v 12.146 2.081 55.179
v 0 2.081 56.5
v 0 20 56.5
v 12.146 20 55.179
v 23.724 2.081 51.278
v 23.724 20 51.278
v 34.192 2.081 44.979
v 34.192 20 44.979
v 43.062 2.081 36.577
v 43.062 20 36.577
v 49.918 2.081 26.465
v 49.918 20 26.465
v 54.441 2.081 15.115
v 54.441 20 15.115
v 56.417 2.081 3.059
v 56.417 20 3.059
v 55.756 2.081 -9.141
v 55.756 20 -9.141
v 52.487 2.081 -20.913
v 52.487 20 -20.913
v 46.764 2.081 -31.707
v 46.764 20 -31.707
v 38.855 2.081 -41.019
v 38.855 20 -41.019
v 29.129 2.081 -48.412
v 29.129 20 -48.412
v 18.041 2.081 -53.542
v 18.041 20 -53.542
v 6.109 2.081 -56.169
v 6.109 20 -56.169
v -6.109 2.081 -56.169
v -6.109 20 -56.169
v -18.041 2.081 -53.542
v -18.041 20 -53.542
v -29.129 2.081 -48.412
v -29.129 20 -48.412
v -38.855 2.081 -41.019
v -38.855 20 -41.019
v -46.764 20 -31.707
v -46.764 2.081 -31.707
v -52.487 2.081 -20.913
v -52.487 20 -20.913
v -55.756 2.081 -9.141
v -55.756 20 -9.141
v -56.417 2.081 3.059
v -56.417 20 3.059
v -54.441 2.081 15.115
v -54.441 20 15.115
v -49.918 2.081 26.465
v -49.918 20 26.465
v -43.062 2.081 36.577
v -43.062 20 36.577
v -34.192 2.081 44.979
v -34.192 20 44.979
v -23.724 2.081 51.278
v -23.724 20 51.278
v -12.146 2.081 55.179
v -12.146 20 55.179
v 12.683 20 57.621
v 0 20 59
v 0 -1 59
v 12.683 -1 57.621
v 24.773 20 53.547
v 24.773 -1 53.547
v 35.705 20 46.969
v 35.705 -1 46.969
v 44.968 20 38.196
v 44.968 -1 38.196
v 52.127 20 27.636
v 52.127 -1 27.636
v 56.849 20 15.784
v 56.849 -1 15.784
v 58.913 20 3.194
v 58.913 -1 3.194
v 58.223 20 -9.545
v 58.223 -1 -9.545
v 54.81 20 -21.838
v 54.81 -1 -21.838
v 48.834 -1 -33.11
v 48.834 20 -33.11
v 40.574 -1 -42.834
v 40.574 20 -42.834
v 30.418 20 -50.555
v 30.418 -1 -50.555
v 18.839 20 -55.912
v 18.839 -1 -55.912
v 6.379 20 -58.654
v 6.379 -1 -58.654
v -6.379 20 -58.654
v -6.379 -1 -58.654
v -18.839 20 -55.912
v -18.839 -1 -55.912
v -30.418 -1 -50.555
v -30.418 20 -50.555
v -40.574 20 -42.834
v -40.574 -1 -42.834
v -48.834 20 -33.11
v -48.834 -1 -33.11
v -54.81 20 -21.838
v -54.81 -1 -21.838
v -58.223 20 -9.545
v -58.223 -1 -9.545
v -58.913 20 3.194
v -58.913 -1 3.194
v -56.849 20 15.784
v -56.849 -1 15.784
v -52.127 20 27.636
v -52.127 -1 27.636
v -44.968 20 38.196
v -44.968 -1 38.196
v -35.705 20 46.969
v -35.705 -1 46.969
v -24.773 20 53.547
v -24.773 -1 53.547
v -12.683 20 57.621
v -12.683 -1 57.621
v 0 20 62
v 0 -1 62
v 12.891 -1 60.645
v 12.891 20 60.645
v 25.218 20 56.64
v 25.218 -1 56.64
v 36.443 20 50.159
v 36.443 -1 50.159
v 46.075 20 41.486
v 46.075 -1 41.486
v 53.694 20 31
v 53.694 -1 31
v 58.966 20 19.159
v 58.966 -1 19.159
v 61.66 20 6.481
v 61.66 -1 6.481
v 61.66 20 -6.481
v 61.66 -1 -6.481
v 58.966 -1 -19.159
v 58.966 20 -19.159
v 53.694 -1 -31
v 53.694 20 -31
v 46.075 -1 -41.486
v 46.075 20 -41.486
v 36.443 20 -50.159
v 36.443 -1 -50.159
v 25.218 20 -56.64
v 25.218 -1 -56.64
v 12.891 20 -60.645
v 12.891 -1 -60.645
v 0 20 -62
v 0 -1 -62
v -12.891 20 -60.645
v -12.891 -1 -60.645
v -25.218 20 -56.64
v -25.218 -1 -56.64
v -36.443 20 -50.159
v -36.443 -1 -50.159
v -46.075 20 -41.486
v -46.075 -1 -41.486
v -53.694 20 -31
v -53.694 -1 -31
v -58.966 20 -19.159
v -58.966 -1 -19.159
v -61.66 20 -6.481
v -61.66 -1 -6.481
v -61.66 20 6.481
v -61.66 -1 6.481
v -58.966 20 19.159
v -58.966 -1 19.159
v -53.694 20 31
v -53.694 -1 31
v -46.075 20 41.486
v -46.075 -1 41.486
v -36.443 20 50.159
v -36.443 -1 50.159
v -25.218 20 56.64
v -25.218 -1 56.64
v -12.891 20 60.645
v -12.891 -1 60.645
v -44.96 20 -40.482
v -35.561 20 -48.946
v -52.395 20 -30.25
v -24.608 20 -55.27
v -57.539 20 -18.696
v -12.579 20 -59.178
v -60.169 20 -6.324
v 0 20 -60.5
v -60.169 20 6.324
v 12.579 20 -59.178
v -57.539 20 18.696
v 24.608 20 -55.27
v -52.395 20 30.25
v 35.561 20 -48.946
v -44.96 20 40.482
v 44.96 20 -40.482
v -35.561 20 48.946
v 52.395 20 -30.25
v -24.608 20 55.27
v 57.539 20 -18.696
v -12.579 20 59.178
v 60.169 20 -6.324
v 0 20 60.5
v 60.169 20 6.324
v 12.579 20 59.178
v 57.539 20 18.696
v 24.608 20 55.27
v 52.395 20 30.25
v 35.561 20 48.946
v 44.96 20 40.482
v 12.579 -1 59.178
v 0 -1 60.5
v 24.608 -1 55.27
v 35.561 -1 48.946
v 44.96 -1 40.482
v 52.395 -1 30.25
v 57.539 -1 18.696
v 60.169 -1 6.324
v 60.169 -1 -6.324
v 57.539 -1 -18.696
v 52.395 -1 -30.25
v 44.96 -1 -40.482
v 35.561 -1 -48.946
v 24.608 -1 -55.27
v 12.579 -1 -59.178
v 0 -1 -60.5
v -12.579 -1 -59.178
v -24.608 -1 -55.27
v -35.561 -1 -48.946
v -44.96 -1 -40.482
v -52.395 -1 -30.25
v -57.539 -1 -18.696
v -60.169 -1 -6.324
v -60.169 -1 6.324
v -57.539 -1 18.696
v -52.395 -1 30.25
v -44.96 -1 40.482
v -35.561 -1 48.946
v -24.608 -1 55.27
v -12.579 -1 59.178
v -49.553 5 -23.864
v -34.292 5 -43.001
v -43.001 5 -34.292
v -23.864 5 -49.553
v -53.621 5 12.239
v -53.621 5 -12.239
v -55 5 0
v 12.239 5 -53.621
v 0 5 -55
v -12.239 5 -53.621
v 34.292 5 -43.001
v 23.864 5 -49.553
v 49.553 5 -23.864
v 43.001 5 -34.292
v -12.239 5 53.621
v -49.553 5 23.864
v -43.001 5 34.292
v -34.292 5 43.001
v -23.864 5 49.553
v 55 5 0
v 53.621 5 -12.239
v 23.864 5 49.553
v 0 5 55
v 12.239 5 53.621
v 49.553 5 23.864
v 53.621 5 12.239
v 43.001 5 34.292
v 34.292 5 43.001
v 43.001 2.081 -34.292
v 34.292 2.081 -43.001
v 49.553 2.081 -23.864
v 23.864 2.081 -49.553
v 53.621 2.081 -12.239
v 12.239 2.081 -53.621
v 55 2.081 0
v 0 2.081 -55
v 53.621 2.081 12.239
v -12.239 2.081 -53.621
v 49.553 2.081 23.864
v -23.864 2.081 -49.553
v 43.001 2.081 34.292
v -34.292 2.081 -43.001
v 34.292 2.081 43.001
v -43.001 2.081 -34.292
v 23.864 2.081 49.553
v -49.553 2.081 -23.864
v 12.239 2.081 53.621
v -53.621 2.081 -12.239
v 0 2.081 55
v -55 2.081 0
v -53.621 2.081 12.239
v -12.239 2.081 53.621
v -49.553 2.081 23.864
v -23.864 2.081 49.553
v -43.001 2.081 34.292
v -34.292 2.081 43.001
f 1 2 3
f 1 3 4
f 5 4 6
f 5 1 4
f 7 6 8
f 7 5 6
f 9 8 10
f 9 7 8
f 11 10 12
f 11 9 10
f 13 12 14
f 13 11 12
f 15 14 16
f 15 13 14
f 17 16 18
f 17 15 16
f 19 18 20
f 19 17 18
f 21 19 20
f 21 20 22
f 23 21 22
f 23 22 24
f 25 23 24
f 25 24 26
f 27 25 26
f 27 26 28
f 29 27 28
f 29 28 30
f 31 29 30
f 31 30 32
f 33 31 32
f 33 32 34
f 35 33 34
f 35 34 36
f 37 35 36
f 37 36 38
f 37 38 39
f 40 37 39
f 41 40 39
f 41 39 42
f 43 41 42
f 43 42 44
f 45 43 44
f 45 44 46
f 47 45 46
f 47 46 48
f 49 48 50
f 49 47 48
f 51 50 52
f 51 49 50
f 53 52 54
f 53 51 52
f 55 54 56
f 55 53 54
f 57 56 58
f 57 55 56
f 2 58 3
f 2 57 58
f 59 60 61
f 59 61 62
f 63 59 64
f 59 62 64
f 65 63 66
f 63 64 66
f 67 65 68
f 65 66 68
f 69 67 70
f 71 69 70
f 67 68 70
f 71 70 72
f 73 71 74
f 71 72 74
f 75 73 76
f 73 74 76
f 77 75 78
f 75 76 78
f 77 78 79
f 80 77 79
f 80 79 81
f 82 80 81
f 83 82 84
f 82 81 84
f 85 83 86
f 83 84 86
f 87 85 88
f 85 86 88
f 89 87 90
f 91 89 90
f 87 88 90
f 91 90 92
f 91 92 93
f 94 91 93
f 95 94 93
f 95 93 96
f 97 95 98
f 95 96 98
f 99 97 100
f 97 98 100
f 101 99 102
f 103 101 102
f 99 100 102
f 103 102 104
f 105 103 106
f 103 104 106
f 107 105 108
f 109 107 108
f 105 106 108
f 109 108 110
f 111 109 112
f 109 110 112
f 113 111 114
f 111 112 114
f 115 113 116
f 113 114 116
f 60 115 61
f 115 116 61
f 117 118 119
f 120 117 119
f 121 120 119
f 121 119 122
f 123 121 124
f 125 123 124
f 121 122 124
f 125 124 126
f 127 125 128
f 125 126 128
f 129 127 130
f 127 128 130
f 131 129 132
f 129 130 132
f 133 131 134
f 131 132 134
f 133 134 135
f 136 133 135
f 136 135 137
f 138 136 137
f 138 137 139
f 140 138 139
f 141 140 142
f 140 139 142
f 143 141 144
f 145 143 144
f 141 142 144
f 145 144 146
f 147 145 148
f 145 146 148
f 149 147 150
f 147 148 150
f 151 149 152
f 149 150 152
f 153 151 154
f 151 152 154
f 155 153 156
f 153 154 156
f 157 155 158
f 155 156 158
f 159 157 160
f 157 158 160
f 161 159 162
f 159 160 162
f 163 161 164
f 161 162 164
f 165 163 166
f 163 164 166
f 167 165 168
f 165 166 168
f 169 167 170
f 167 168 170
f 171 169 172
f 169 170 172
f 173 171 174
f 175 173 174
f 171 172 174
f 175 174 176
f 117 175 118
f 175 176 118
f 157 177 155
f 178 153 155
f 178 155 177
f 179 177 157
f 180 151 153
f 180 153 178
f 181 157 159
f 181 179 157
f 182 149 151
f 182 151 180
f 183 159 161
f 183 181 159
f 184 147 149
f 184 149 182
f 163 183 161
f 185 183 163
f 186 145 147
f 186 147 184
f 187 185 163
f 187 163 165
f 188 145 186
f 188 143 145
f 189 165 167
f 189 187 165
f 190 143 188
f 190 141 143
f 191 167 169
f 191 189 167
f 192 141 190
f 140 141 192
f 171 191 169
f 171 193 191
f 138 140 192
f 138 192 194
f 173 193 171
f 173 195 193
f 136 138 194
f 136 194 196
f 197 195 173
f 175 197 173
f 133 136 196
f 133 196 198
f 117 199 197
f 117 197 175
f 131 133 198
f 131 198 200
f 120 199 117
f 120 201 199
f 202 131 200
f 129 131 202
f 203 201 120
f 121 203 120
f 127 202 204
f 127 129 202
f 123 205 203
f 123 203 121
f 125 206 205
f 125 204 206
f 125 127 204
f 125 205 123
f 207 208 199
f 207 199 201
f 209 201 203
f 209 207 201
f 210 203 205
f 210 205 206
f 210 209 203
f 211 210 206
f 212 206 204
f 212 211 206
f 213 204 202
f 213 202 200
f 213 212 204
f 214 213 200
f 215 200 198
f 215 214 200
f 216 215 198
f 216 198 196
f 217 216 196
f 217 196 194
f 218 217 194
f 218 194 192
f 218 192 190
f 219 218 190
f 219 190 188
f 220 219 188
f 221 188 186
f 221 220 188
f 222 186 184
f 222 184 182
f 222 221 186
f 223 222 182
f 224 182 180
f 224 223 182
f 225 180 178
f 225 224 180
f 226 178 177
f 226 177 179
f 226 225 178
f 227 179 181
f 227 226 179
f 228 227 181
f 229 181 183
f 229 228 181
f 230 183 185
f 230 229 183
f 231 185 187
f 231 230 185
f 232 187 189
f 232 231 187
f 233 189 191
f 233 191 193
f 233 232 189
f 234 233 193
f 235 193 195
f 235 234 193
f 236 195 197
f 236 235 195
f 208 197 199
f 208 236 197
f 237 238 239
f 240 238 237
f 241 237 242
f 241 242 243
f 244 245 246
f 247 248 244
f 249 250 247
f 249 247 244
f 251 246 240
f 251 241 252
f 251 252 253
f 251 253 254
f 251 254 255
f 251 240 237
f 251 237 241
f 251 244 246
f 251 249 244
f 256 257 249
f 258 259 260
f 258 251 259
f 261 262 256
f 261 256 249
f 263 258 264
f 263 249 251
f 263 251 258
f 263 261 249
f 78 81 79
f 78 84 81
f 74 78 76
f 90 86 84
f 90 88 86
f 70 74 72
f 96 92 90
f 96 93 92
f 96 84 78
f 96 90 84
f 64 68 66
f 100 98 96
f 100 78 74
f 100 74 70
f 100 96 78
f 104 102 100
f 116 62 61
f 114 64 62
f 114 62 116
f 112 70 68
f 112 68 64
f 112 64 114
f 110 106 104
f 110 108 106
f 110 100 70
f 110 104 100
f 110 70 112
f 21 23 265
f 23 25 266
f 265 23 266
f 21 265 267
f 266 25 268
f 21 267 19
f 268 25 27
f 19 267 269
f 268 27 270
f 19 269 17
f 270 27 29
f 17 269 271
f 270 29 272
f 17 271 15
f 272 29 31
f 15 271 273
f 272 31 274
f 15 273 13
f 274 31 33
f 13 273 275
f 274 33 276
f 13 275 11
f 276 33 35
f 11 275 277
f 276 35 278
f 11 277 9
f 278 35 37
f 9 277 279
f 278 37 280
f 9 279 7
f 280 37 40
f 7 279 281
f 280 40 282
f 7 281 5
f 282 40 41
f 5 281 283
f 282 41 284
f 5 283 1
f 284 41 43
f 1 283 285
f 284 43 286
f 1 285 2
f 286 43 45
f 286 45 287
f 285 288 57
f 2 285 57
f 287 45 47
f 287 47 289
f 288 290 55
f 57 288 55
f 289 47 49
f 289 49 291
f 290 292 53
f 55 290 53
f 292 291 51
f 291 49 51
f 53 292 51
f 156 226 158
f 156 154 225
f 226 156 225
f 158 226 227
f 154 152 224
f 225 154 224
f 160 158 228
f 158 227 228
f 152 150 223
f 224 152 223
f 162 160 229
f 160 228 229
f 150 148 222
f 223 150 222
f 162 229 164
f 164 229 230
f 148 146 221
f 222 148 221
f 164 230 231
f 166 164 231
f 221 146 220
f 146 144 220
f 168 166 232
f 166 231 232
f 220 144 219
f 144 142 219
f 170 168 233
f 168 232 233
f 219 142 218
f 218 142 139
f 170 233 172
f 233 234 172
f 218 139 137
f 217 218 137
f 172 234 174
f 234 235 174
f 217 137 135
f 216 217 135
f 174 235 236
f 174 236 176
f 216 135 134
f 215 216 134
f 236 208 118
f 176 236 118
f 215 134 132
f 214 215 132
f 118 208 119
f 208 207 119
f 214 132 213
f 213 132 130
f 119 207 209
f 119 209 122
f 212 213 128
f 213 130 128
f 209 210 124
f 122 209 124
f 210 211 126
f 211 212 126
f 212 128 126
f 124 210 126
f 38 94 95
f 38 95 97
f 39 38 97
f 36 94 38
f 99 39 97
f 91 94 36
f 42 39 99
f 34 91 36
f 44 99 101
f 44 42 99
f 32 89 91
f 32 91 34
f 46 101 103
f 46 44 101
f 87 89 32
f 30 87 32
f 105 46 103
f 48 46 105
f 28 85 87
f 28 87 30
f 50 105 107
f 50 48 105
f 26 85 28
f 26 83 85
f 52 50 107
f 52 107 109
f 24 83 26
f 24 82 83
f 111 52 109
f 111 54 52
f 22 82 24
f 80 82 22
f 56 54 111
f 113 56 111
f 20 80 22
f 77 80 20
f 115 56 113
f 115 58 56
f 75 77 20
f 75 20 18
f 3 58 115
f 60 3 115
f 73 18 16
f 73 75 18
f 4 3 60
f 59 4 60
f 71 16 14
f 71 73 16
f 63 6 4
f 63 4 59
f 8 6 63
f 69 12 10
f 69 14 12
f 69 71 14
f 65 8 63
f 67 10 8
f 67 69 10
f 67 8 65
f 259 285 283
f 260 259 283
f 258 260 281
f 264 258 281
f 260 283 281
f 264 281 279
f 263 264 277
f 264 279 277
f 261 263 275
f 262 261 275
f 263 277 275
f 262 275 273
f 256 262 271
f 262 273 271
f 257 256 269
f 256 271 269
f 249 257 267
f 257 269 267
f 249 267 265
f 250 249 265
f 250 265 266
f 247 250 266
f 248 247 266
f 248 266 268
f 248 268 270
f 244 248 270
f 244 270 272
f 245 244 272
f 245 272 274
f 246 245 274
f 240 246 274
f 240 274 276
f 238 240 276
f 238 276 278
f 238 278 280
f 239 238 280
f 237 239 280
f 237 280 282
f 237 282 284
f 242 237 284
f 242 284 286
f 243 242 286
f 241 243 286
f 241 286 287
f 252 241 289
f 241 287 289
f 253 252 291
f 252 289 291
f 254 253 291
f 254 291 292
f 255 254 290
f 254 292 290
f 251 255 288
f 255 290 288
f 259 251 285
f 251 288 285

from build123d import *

# Parameters (mm, degrees)
BOSS_EXTRUDE1_DEPTH        = 20
BOSS_EXTRUDE1_DEPTH_BACK   = 1
SKETCH2_R                  = 55
BOSS_EXTRUDE1_2_DEPTH      = 20
BOSS_EXTRUDE1_2_DEPTH_BACK = 1
SKETCH2_R_2                = 59
SKETCH2_R_3                = 56.5
BOSS_EXTRUDE1_3_DEPTH      = 20
BOSS_EXTRUDE1_3_DEPTH_BACK = 1
SKETCH2_R_4                = 62
SKETCH2_R_5                = 60.5
SKETCH6_R                  = 55
CUT_EXTRUDE1_DEPTH         = 15
SKETCH7_R                  = 56.5
SKETCH7_R_2                = 55
BOSS_EXTRUDE3_DEPTH        = 3.080746367


with BuildPart() as part:
    # Sketch2 → Boss-Extrude1 (new, two sides: drawn at the far end of the back side and taken through both)
    with BuildSketch(Plane(origin=(0, 0, 0), x_dir=(1, 0, 0), z_dir=(0, 1, 0)).offset(-BOSS_EXTRUDE1_DEPTH_BACK)):
        with Locations(Location((0, 0, 0), (0, 0, 270))):
            Circle(SKETCH2_R)
    extrude(amount=BOSS_EXTRUDE1_DEPTH + BOSS_EXTRUDE1_DEPTH_BACK)

    # Sketch6 → Cut-Extrude1 (cut)
    with BuildSketch(Plane(origin=(0, 20, 0), x_dir=(1, 0, 0), z_dir=(0, 1, 0))):
        with Locations(Location((0, 0, 0), (0, 0, 270))):
            Circle(SKETCH6_R)
    extrude(amount=-CUT_EXTRUDE1_DEPTH, mode=Mode.SUBTRACT)



with BuildPart() as body_2:
    # Sketch2 → Boss-Extrude1 2 (new, two sides: drawn at the far end of the back side and taken through both)
    with BuildSketch(Plane(origin=(0, 0, 0), x_dir=(1, 0, 0), z_dir=(0, 1, 0)).offset(-BOSS_EXTRUDE1_2_DEPTH_BACK)):
        with Locations(Location((0, 0, 0), (0, 0, 270))):
            Circle(SKETCH2_R_2)
        with Locations(Location((0, 0, 0), (0, 0, 270))):
            Circle(SKETCH2_R_3, mode=Mode.SUBTRACT)
    extrude(amount=BOSS_EXTRUDE1_2_DEPTH + BOSS_EXTRUDE1_2_DEPTH_BACK)


with BuildPart() as body_3:
    # Sketch2 → Boss-Extrude1 3 (new, two sides: drawn at the far end of the back side and taken through both)
    with BuildSketch(Plane(origin=(0, 0, 0), x_dir=(1, 0, 0), z_dir=(0, 1, 0)).offset(-BOSS_EXTRUDE1_3_DEPTH_BACK)):
        with Locations(Location((0, 0, 0), (0, 0, 270))):
            Circle(SKETCH2_R_4)
        with Locations(Location((0, 0, 0), (0, 0, 270))):
            Circle(SKETCH2_R_5, mode=Mode.SUBTRACT)
    extrude(amount=BOSS_EXTRUDE1_3_DEPTH + BOSS_EXTRUDE1_3_DEPTH_BACK)


with BuildPart() as part_1:
    add(part.part)

    add(body_2.part)  # Boss-Extrude3 merges body 2
    # Sketch7 → Boss-Extrude3 (add)
    with BuildSketch(Plane.XZ.offset(1)):
        with Locations(Location((0, 0, 0), (0, 0, 90))):
            Circle(SKETCH7_R)
        with Locations(Location((0, 0, 0), (0, 0, 90))):
            Circle(SKETCH7_R_2, mode=Mode.SUBTRACT)
    extrude(amount=-BOSS_EXTRUDE3_DEPTH)


solid = Compound([body_3.part, part_1.part])
